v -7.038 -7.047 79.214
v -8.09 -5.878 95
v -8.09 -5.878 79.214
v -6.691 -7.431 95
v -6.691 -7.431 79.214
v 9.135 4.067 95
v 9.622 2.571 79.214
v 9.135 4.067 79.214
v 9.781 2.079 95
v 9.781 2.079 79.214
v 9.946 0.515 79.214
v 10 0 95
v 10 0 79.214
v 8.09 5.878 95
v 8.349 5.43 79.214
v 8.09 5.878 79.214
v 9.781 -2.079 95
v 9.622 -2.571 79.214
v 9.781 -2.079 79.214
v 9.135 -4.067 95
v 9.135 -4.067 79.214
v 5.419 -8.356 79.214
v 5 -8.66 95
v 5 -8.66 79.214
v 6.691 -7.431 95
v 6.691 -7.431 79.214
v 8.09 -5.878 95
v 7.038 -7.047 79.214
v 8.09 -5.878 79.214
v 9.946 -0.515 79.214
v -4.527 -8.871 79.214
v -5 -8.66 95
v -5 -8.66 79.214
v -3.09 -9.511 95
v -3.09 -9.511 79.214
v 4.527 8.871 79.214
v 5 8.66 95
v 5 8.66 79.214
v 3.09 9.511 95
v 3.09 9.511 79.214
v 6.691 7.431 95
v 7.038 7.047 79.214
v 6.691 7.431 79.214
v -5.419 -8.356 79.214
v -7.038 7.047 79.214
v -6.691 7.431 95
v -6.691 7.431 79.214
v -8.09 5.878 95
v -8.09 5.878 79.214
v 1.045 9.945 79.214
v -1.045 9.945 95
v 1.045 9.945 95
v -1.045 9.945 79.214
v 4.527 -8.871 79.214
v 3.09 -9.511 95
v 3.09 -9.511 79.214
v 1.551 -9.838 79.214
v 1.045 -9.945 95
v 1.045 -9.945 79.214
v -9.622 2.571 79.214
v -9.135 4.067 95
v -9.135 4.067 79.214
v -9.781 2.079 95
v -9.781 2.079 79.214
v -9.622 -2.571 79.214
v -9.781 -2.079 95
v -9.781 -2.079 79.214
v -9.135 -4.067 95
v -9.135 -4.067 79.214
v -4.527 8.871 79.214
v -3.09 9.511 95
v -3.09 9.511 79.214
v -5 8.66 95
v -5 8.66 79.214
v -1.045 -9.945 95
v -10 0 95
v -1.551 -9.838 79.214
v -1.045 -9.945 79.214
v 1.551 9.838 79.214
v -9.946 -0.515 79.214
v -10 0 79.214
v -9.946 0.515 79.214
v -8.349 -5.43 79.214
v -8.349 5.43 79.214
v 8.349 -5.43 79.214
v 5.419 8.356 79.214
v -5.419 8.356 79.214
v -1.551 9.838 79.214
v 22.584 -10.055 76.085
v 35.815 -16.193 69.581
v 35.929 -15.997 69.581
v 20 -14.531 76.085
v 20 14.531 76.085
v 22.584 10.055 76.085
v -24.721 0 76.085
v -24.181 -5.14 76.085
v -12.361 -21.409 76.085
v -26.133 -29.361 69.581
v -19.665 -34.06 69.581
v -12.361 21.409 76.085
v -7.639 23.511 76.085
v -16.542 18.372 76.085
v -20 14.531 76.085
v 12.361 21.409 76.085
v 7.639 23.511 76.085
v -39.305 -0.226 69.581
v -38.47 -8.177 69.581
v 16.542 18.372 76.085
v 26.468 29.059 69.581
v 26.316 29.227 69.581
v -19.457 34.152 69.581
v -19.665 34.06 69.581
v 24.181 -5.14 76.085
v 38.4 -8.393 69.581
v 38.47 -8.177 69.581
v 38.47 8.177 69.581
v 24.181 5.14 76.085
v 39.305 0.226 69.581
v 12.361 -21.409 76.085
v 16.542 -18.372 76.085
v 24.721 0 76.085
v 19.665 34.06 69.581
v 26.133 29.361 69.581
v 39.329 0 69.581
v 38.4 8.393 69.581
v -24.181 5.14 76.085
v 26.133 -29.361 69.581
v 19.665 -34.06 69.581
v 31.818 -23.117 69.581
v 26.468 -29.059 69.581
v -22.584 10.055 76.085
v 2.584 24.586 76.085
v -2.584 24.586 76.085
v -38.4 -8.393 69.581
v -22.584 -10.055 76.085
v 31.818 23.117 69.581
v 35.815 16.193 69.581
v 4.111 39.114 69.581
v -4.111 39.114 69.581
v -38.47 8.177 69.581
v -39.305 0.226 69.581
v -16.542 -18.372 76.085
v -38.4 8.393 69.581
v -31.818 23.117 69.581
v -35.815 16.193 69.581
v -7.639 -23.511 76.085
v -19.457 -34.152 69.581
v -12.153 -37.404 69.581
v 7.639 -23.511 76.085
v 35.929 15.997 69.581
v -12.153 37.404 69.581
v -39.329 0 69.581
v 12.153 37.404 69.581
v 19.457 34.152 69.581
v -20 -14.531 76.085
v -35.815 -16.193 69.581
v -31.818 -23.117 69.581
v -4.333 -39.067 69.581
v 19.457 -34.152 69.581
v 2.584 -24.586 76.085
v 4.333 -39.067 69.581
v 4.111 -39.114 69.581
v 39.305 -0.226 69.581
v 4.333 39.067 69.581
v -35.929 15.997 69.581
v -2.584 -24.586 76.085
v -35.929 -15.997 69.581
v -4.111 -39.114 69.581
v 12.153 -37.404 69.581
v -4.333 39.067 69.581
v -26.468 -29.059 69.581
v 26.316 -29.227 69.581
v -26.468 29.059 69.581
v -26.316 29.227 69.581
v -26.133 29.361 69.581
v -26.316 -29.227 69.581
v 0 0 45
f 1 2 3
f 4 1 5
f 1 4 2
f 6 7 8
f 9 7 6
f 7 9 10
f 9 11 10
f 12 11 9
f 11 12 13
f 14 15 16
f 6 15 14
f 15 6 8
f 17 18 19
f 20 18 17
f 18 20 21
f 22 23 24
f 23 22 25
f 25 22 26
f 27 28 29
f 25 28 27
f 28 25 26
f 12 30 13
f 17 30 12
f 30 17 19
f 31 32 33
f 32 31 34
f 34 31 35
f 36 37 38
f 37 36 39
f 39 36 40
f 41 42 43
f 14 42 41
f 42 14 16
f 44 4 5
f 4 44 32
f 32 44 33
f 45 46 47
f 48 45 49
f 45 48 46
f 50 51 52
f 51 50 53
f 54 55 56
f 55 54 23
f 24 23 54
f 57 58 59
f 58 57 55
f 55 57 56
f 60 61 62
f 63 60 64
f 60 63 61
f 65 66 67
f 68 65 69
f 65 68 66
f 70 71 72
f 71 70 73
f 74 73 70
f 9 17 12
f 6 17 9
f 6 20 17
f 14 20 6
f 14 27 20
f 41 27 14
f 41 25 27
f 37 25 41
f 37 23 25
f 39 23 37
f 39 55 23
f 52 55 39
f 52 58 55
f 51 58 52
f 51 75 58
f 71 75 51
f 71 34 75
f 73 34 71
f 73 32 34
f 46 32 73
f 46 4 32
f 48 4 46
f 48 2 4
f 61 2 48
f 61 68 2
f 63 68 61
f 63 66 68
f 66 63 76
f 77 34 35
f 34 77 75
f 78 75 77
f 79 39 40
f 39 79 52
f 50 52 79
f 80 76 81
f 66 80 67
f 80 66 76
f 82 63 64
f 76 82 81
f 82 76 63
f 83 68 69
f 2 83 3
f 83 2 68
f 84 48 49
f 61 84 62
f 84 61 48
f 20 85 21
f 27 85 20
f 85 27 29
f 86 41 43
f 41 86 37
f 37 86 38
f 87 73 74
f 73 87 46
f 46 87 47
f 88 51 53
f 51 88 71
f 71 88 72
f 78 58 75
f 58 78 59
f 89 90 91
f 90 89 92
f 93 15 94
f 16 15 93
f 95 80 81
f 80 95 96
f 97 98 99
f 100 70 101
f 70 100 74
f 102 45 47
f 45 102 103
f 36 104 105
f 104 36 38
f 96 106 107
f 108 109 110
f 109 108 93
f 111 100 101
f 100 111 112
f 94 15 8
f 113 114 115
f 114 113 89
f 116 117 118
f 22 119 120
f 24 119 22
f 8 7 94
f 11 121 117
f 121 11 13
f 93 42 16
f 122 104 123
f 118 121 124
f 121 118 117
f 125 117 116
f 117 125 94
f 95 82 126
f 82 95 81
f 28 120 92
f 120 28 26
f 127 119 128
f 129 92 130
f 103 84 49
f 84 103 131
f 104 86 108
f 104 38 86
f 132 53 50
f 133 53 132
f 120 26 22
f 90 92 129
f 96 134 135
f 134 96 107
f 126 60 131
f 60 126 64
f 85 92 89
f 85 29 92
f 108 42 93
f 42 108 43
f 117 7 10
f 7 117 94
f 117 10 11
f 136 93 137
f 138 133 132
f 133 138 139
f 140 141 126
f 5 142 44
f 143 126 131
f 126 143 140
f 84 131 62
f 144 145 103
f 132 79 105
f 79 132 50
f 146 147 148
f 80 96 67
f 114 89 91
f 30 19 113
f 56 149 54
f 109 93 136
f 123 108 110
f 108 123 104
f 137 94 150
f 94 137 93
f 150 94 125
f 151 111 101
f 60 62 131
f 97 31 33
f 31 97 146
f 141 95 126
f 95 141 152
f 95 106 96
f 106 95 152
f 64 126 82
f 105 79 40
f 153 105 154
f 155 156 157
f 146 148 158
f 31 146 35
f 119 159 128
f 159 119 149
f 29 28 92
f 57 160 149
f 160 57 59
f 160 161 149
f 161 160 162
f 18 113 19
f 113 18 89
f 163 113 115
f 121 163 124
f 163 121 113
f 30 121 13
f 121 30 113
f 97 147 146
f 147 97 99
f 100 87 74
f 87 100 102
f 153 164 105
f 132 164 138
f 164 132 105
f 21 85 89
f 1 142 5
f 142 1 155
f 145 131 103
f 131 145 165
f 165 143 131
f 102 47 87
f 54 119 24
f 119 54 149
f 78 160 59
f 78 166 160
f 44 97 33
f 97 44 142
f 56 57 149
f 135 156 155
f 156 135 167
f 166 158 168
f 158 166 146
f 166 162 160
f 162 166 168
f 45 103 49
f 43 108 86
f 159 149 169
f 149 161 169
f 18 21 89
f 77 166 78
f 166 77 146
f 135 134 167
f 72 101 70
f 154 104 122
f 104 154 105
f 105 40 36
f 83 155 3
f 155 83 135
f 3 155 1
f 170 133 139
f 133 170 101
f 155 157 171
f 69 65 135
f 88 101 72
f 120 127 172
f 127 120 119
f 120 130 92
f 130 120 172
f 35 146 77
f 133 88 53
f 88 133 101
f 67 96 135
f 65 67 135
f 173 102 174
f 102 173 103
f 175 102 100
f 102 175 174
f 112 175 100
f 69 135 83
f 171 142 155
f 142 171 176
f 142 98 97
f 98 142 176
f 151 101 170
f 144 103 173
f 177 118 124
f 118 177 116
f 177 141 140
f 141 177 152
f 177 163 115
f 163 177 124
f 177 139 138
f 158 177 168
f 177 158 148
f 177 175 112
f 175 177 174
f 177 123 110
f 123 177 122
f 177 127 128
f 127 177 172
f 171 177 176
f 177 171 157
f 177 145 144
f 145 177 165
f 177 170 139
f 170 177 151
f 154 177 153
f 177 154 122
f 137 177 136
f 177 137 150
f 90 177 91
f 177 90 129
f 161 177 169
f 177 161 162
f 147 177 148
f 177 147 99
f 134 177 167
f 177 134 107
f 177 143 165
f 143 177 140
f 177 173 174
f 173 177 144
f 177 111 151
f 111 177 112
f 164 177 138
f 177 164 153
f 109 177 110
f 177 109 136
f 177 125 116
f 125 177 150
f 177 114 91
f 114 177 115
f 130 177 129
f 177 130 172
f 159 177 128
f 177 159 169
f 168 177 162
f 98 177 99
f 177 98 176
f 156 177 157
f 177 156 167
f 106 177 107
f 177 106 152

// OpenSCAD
intersection() {
  union() {
    translate([0, 0, 75]) cylinder(20, 10, 10);
    sphere(80);
  }
  translate([0, 0, 45]) cylinder(50, 0, 80);
}
